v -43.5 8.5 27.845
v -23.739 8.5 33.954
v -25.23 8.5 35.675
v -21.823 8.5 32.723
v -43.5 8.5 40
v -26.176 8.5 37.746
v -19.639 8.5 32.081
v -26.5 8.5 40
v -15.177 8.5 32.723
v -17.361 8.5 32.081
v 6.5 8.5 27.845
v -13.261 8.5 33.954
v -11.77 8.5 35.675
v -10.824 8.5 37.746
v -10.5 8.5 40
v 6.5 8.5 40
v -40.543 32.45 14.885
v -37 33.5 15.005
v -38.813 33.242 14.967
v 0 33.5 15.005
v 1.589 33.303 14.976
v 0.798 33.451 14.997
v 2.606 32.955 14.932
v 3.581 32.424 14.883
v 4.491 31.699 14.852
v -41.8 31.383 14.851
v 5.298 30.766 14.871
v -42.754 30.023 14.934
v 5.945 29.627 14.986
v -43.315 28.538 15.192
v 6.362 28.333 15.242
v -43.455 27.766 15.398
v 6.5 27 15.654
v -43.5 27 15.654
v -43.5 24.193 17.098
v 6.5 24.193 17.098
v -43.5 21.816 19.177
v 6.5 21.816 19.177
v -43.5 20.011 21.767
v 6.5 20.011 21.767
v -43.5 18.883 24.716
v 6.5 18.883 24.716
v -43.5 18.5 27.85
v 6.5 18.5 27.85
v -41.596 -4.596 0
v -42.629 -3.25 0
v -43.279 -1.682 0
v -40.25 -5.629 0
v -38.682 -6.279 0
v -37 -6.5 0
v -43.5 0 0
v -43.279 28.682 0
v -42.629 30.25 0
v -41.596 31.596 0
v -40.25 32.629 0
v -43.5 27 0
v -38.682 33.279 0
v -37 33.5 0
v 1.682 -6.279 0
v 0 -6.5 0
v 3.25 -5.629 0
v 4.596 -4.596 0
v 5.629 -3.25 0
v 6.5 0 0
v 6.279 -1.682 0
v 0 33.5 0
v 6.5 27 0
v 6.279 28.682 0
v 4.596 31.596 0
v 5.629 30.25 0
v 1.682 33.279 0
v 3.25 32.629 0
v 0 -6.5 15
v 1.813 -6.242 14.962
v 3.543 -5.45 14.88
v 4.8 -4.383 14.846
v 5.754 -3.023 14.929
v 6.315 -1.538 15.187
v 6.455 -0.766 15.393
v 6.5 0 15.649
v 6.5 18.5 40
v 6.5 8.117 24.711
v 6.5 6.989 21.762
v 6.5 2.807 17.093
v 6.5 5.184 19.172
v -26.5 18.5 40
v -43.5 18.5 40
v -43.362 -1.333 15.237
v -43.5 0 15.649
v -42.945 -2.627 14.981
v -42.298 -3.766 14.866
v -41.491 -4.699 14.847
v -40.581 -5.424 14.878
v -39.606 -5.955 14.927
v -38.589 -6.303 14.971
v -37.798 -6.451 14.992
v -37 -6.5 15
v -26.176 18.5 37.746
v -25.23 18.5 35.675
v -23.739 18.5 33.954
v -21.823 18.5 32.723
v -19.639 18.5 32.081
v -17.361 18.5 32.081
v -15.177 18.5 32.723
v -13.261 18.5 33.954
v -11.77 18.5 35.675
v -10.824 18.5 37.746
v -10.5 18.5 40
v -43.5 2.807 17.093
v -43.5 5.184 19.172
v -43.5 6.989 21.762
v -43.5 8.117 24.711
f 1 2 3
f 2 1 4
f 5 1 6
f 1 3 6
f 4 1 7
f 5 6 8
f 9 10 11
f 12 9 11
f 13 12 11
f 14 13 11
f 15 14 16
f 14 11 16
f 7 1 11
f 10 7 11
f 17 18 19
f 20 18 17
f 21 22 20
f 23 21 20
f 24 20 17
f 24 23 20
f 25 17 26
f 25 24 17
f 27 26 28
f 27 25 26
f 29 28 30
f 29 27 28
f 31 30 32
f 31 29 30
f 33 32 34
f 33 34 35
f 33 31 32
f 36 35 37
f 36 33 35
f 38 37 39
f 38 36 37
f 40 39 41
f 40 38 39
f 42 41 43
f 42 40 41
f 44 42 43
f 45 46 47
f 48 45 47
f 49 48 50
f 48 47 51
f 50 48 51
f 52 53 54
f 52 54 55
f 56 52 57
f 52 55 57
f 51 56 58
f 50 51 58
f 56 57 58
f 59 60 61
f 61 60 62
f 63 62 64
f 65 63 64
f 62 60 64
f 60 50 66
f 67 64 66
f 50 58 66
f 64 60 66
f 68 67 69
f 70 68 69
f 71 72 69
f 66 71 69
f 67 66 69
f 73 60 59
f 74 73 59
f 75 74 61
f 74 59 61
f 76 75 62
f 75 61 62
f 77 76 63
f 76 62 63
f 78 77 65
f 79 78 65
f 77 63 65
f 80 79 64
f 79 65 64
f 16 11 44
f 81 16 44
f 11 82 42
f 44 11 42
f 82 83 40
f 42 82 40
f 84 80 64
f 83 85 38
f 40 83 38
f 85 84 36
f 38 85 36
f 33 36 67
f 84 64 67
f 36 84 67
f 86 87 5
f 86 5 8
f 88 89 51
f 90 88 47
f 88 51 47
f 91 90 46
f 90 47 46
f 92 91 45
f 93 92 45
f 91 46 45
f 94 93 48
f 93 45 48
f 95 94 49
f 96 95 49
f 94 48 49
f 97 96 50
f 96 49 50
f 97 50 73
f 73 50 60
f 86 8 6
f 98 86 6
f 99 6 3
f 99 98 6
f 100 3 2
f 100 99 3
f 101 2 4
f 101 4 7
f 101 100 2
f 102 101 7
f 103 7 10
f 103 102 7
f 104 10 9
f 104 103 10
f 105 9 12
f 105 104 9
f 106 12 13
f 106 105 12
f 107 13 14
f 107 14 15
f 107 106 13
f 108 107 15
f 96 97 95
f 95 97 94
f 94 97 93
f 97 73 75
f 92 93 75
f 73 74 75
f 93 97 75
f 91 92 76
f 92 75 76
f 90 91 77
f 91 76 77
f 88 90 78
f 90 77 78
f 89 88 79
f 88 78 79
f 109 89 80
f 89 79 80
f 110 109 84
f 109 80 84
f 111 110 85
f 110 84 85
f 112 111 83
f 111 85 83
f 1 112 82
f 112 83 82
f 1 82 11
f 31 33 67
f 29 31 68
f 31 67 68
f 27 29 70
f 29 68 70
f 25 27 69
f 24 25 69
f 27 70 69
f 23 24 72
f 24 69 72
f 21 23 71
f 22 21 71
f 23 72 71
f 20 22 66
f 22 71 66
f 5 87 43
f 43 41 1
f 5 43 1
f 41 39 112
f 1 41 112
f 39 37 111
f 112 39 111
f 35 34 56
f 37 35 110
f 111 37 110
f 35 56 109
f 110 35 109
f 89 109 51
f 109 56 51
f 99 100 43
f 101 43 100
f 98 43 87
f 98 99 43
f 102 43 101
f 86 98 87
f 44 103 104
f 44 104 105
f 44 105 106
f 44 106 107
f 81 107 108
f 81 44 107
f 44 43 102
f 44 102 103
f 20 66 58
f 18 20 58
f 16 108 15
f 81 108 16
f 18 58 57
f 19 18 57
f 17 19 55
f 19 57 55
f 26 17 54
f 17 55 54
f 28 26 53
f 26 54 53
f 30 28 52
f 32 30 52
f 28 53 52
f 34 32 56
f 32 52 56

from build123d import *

# Parameters (mm, degrees)
BOSS_EXTRUDE3_DEPTH = 40
CUT_EXTRUDE1_DEPTH  = 73.265136823
CUT_EXTRUDE2_DEPTH  = 10


with BuildPart() as part:
    # Sketch1 → Boss-Extrude3 (new body)
    with BuildSketch(Plane.XY):
        with BuildLine():
            Line((-37, -6.5), (0, -6.5))
            ThreePointArc((0, -6.5), (4.596194078, -4.596194078), (6.5, 0))
            Line((6.5, 0), (6.5, 27))
            ThreePointArc((6.5, 27), (4.596194078, 31.596194078), (0, 33.5))
            Line((0, 33.5), (-37, 33.5))
            ThreePointArc((-37, 33.5), (-41.596194078, 31.596194078), (-43.5, 27))
            Line((-43.5, 27), (-43.5, 0))
            ThreePointArc((-43.5, 0), (-41.596194078, -4.596194078), (-37, -6.5))
        make_face()
    extrude(amount=BOSS_EXTRUDE3_DEPTH)

    # Sketch3 → Cut-Extrude1 (cut, through all)
    with BuildSketch(Plane(origin=(6.5, 0, 0), x_dir=(0, 0, -1), z_dir=(1, 0, 0))):
        with BuildLine():
            Line((-27.850101272, 18.5), (-40, 18.5))
            Line((-40, 18.5), (-40, 33.5))
            Line((-40, 33.5), (-15.004868693, 33.5))
            ThreePointArc((-15.004868693, 33.5), (-17.975892442, 23.044232737), (-27.850101272, 18.5))
        make_face()
        with BuildLine():
            Line((-40, 8.5), (-40, -6.5))
            Line((-40, -6.5), (-15, -6.5))
            ThreePointArc((-15, -6.5), (-17.97102375, 3.955767263), (-27.845232579, 8.5))
            Line((-27.845232579, 8.5), (-40, 8.5))
        make_face()
    extrude(amount=-CUT_EXTRUDE1_DEPTH, mode=Mode.SUBTRACT)

    # Sketch4 → Cut-Extrude2 (cut)
    with BuildSketch(Plane(origin=(0, 18.5, 0), x_dir=(1, 0, 0), z_dir=(0, 1, 0))):
        with BuildLine():
            Line((-10.5, -40), (-26.5, -40))
            ThreePointArc((-26.5, -40), (-18.5, -32), (-10.5, -40))
        make_face()
    extrude(amount=-CUT_EXTRUDE2_DEPTH, mode=Mode.SUBTRACT)


solid = part.part
